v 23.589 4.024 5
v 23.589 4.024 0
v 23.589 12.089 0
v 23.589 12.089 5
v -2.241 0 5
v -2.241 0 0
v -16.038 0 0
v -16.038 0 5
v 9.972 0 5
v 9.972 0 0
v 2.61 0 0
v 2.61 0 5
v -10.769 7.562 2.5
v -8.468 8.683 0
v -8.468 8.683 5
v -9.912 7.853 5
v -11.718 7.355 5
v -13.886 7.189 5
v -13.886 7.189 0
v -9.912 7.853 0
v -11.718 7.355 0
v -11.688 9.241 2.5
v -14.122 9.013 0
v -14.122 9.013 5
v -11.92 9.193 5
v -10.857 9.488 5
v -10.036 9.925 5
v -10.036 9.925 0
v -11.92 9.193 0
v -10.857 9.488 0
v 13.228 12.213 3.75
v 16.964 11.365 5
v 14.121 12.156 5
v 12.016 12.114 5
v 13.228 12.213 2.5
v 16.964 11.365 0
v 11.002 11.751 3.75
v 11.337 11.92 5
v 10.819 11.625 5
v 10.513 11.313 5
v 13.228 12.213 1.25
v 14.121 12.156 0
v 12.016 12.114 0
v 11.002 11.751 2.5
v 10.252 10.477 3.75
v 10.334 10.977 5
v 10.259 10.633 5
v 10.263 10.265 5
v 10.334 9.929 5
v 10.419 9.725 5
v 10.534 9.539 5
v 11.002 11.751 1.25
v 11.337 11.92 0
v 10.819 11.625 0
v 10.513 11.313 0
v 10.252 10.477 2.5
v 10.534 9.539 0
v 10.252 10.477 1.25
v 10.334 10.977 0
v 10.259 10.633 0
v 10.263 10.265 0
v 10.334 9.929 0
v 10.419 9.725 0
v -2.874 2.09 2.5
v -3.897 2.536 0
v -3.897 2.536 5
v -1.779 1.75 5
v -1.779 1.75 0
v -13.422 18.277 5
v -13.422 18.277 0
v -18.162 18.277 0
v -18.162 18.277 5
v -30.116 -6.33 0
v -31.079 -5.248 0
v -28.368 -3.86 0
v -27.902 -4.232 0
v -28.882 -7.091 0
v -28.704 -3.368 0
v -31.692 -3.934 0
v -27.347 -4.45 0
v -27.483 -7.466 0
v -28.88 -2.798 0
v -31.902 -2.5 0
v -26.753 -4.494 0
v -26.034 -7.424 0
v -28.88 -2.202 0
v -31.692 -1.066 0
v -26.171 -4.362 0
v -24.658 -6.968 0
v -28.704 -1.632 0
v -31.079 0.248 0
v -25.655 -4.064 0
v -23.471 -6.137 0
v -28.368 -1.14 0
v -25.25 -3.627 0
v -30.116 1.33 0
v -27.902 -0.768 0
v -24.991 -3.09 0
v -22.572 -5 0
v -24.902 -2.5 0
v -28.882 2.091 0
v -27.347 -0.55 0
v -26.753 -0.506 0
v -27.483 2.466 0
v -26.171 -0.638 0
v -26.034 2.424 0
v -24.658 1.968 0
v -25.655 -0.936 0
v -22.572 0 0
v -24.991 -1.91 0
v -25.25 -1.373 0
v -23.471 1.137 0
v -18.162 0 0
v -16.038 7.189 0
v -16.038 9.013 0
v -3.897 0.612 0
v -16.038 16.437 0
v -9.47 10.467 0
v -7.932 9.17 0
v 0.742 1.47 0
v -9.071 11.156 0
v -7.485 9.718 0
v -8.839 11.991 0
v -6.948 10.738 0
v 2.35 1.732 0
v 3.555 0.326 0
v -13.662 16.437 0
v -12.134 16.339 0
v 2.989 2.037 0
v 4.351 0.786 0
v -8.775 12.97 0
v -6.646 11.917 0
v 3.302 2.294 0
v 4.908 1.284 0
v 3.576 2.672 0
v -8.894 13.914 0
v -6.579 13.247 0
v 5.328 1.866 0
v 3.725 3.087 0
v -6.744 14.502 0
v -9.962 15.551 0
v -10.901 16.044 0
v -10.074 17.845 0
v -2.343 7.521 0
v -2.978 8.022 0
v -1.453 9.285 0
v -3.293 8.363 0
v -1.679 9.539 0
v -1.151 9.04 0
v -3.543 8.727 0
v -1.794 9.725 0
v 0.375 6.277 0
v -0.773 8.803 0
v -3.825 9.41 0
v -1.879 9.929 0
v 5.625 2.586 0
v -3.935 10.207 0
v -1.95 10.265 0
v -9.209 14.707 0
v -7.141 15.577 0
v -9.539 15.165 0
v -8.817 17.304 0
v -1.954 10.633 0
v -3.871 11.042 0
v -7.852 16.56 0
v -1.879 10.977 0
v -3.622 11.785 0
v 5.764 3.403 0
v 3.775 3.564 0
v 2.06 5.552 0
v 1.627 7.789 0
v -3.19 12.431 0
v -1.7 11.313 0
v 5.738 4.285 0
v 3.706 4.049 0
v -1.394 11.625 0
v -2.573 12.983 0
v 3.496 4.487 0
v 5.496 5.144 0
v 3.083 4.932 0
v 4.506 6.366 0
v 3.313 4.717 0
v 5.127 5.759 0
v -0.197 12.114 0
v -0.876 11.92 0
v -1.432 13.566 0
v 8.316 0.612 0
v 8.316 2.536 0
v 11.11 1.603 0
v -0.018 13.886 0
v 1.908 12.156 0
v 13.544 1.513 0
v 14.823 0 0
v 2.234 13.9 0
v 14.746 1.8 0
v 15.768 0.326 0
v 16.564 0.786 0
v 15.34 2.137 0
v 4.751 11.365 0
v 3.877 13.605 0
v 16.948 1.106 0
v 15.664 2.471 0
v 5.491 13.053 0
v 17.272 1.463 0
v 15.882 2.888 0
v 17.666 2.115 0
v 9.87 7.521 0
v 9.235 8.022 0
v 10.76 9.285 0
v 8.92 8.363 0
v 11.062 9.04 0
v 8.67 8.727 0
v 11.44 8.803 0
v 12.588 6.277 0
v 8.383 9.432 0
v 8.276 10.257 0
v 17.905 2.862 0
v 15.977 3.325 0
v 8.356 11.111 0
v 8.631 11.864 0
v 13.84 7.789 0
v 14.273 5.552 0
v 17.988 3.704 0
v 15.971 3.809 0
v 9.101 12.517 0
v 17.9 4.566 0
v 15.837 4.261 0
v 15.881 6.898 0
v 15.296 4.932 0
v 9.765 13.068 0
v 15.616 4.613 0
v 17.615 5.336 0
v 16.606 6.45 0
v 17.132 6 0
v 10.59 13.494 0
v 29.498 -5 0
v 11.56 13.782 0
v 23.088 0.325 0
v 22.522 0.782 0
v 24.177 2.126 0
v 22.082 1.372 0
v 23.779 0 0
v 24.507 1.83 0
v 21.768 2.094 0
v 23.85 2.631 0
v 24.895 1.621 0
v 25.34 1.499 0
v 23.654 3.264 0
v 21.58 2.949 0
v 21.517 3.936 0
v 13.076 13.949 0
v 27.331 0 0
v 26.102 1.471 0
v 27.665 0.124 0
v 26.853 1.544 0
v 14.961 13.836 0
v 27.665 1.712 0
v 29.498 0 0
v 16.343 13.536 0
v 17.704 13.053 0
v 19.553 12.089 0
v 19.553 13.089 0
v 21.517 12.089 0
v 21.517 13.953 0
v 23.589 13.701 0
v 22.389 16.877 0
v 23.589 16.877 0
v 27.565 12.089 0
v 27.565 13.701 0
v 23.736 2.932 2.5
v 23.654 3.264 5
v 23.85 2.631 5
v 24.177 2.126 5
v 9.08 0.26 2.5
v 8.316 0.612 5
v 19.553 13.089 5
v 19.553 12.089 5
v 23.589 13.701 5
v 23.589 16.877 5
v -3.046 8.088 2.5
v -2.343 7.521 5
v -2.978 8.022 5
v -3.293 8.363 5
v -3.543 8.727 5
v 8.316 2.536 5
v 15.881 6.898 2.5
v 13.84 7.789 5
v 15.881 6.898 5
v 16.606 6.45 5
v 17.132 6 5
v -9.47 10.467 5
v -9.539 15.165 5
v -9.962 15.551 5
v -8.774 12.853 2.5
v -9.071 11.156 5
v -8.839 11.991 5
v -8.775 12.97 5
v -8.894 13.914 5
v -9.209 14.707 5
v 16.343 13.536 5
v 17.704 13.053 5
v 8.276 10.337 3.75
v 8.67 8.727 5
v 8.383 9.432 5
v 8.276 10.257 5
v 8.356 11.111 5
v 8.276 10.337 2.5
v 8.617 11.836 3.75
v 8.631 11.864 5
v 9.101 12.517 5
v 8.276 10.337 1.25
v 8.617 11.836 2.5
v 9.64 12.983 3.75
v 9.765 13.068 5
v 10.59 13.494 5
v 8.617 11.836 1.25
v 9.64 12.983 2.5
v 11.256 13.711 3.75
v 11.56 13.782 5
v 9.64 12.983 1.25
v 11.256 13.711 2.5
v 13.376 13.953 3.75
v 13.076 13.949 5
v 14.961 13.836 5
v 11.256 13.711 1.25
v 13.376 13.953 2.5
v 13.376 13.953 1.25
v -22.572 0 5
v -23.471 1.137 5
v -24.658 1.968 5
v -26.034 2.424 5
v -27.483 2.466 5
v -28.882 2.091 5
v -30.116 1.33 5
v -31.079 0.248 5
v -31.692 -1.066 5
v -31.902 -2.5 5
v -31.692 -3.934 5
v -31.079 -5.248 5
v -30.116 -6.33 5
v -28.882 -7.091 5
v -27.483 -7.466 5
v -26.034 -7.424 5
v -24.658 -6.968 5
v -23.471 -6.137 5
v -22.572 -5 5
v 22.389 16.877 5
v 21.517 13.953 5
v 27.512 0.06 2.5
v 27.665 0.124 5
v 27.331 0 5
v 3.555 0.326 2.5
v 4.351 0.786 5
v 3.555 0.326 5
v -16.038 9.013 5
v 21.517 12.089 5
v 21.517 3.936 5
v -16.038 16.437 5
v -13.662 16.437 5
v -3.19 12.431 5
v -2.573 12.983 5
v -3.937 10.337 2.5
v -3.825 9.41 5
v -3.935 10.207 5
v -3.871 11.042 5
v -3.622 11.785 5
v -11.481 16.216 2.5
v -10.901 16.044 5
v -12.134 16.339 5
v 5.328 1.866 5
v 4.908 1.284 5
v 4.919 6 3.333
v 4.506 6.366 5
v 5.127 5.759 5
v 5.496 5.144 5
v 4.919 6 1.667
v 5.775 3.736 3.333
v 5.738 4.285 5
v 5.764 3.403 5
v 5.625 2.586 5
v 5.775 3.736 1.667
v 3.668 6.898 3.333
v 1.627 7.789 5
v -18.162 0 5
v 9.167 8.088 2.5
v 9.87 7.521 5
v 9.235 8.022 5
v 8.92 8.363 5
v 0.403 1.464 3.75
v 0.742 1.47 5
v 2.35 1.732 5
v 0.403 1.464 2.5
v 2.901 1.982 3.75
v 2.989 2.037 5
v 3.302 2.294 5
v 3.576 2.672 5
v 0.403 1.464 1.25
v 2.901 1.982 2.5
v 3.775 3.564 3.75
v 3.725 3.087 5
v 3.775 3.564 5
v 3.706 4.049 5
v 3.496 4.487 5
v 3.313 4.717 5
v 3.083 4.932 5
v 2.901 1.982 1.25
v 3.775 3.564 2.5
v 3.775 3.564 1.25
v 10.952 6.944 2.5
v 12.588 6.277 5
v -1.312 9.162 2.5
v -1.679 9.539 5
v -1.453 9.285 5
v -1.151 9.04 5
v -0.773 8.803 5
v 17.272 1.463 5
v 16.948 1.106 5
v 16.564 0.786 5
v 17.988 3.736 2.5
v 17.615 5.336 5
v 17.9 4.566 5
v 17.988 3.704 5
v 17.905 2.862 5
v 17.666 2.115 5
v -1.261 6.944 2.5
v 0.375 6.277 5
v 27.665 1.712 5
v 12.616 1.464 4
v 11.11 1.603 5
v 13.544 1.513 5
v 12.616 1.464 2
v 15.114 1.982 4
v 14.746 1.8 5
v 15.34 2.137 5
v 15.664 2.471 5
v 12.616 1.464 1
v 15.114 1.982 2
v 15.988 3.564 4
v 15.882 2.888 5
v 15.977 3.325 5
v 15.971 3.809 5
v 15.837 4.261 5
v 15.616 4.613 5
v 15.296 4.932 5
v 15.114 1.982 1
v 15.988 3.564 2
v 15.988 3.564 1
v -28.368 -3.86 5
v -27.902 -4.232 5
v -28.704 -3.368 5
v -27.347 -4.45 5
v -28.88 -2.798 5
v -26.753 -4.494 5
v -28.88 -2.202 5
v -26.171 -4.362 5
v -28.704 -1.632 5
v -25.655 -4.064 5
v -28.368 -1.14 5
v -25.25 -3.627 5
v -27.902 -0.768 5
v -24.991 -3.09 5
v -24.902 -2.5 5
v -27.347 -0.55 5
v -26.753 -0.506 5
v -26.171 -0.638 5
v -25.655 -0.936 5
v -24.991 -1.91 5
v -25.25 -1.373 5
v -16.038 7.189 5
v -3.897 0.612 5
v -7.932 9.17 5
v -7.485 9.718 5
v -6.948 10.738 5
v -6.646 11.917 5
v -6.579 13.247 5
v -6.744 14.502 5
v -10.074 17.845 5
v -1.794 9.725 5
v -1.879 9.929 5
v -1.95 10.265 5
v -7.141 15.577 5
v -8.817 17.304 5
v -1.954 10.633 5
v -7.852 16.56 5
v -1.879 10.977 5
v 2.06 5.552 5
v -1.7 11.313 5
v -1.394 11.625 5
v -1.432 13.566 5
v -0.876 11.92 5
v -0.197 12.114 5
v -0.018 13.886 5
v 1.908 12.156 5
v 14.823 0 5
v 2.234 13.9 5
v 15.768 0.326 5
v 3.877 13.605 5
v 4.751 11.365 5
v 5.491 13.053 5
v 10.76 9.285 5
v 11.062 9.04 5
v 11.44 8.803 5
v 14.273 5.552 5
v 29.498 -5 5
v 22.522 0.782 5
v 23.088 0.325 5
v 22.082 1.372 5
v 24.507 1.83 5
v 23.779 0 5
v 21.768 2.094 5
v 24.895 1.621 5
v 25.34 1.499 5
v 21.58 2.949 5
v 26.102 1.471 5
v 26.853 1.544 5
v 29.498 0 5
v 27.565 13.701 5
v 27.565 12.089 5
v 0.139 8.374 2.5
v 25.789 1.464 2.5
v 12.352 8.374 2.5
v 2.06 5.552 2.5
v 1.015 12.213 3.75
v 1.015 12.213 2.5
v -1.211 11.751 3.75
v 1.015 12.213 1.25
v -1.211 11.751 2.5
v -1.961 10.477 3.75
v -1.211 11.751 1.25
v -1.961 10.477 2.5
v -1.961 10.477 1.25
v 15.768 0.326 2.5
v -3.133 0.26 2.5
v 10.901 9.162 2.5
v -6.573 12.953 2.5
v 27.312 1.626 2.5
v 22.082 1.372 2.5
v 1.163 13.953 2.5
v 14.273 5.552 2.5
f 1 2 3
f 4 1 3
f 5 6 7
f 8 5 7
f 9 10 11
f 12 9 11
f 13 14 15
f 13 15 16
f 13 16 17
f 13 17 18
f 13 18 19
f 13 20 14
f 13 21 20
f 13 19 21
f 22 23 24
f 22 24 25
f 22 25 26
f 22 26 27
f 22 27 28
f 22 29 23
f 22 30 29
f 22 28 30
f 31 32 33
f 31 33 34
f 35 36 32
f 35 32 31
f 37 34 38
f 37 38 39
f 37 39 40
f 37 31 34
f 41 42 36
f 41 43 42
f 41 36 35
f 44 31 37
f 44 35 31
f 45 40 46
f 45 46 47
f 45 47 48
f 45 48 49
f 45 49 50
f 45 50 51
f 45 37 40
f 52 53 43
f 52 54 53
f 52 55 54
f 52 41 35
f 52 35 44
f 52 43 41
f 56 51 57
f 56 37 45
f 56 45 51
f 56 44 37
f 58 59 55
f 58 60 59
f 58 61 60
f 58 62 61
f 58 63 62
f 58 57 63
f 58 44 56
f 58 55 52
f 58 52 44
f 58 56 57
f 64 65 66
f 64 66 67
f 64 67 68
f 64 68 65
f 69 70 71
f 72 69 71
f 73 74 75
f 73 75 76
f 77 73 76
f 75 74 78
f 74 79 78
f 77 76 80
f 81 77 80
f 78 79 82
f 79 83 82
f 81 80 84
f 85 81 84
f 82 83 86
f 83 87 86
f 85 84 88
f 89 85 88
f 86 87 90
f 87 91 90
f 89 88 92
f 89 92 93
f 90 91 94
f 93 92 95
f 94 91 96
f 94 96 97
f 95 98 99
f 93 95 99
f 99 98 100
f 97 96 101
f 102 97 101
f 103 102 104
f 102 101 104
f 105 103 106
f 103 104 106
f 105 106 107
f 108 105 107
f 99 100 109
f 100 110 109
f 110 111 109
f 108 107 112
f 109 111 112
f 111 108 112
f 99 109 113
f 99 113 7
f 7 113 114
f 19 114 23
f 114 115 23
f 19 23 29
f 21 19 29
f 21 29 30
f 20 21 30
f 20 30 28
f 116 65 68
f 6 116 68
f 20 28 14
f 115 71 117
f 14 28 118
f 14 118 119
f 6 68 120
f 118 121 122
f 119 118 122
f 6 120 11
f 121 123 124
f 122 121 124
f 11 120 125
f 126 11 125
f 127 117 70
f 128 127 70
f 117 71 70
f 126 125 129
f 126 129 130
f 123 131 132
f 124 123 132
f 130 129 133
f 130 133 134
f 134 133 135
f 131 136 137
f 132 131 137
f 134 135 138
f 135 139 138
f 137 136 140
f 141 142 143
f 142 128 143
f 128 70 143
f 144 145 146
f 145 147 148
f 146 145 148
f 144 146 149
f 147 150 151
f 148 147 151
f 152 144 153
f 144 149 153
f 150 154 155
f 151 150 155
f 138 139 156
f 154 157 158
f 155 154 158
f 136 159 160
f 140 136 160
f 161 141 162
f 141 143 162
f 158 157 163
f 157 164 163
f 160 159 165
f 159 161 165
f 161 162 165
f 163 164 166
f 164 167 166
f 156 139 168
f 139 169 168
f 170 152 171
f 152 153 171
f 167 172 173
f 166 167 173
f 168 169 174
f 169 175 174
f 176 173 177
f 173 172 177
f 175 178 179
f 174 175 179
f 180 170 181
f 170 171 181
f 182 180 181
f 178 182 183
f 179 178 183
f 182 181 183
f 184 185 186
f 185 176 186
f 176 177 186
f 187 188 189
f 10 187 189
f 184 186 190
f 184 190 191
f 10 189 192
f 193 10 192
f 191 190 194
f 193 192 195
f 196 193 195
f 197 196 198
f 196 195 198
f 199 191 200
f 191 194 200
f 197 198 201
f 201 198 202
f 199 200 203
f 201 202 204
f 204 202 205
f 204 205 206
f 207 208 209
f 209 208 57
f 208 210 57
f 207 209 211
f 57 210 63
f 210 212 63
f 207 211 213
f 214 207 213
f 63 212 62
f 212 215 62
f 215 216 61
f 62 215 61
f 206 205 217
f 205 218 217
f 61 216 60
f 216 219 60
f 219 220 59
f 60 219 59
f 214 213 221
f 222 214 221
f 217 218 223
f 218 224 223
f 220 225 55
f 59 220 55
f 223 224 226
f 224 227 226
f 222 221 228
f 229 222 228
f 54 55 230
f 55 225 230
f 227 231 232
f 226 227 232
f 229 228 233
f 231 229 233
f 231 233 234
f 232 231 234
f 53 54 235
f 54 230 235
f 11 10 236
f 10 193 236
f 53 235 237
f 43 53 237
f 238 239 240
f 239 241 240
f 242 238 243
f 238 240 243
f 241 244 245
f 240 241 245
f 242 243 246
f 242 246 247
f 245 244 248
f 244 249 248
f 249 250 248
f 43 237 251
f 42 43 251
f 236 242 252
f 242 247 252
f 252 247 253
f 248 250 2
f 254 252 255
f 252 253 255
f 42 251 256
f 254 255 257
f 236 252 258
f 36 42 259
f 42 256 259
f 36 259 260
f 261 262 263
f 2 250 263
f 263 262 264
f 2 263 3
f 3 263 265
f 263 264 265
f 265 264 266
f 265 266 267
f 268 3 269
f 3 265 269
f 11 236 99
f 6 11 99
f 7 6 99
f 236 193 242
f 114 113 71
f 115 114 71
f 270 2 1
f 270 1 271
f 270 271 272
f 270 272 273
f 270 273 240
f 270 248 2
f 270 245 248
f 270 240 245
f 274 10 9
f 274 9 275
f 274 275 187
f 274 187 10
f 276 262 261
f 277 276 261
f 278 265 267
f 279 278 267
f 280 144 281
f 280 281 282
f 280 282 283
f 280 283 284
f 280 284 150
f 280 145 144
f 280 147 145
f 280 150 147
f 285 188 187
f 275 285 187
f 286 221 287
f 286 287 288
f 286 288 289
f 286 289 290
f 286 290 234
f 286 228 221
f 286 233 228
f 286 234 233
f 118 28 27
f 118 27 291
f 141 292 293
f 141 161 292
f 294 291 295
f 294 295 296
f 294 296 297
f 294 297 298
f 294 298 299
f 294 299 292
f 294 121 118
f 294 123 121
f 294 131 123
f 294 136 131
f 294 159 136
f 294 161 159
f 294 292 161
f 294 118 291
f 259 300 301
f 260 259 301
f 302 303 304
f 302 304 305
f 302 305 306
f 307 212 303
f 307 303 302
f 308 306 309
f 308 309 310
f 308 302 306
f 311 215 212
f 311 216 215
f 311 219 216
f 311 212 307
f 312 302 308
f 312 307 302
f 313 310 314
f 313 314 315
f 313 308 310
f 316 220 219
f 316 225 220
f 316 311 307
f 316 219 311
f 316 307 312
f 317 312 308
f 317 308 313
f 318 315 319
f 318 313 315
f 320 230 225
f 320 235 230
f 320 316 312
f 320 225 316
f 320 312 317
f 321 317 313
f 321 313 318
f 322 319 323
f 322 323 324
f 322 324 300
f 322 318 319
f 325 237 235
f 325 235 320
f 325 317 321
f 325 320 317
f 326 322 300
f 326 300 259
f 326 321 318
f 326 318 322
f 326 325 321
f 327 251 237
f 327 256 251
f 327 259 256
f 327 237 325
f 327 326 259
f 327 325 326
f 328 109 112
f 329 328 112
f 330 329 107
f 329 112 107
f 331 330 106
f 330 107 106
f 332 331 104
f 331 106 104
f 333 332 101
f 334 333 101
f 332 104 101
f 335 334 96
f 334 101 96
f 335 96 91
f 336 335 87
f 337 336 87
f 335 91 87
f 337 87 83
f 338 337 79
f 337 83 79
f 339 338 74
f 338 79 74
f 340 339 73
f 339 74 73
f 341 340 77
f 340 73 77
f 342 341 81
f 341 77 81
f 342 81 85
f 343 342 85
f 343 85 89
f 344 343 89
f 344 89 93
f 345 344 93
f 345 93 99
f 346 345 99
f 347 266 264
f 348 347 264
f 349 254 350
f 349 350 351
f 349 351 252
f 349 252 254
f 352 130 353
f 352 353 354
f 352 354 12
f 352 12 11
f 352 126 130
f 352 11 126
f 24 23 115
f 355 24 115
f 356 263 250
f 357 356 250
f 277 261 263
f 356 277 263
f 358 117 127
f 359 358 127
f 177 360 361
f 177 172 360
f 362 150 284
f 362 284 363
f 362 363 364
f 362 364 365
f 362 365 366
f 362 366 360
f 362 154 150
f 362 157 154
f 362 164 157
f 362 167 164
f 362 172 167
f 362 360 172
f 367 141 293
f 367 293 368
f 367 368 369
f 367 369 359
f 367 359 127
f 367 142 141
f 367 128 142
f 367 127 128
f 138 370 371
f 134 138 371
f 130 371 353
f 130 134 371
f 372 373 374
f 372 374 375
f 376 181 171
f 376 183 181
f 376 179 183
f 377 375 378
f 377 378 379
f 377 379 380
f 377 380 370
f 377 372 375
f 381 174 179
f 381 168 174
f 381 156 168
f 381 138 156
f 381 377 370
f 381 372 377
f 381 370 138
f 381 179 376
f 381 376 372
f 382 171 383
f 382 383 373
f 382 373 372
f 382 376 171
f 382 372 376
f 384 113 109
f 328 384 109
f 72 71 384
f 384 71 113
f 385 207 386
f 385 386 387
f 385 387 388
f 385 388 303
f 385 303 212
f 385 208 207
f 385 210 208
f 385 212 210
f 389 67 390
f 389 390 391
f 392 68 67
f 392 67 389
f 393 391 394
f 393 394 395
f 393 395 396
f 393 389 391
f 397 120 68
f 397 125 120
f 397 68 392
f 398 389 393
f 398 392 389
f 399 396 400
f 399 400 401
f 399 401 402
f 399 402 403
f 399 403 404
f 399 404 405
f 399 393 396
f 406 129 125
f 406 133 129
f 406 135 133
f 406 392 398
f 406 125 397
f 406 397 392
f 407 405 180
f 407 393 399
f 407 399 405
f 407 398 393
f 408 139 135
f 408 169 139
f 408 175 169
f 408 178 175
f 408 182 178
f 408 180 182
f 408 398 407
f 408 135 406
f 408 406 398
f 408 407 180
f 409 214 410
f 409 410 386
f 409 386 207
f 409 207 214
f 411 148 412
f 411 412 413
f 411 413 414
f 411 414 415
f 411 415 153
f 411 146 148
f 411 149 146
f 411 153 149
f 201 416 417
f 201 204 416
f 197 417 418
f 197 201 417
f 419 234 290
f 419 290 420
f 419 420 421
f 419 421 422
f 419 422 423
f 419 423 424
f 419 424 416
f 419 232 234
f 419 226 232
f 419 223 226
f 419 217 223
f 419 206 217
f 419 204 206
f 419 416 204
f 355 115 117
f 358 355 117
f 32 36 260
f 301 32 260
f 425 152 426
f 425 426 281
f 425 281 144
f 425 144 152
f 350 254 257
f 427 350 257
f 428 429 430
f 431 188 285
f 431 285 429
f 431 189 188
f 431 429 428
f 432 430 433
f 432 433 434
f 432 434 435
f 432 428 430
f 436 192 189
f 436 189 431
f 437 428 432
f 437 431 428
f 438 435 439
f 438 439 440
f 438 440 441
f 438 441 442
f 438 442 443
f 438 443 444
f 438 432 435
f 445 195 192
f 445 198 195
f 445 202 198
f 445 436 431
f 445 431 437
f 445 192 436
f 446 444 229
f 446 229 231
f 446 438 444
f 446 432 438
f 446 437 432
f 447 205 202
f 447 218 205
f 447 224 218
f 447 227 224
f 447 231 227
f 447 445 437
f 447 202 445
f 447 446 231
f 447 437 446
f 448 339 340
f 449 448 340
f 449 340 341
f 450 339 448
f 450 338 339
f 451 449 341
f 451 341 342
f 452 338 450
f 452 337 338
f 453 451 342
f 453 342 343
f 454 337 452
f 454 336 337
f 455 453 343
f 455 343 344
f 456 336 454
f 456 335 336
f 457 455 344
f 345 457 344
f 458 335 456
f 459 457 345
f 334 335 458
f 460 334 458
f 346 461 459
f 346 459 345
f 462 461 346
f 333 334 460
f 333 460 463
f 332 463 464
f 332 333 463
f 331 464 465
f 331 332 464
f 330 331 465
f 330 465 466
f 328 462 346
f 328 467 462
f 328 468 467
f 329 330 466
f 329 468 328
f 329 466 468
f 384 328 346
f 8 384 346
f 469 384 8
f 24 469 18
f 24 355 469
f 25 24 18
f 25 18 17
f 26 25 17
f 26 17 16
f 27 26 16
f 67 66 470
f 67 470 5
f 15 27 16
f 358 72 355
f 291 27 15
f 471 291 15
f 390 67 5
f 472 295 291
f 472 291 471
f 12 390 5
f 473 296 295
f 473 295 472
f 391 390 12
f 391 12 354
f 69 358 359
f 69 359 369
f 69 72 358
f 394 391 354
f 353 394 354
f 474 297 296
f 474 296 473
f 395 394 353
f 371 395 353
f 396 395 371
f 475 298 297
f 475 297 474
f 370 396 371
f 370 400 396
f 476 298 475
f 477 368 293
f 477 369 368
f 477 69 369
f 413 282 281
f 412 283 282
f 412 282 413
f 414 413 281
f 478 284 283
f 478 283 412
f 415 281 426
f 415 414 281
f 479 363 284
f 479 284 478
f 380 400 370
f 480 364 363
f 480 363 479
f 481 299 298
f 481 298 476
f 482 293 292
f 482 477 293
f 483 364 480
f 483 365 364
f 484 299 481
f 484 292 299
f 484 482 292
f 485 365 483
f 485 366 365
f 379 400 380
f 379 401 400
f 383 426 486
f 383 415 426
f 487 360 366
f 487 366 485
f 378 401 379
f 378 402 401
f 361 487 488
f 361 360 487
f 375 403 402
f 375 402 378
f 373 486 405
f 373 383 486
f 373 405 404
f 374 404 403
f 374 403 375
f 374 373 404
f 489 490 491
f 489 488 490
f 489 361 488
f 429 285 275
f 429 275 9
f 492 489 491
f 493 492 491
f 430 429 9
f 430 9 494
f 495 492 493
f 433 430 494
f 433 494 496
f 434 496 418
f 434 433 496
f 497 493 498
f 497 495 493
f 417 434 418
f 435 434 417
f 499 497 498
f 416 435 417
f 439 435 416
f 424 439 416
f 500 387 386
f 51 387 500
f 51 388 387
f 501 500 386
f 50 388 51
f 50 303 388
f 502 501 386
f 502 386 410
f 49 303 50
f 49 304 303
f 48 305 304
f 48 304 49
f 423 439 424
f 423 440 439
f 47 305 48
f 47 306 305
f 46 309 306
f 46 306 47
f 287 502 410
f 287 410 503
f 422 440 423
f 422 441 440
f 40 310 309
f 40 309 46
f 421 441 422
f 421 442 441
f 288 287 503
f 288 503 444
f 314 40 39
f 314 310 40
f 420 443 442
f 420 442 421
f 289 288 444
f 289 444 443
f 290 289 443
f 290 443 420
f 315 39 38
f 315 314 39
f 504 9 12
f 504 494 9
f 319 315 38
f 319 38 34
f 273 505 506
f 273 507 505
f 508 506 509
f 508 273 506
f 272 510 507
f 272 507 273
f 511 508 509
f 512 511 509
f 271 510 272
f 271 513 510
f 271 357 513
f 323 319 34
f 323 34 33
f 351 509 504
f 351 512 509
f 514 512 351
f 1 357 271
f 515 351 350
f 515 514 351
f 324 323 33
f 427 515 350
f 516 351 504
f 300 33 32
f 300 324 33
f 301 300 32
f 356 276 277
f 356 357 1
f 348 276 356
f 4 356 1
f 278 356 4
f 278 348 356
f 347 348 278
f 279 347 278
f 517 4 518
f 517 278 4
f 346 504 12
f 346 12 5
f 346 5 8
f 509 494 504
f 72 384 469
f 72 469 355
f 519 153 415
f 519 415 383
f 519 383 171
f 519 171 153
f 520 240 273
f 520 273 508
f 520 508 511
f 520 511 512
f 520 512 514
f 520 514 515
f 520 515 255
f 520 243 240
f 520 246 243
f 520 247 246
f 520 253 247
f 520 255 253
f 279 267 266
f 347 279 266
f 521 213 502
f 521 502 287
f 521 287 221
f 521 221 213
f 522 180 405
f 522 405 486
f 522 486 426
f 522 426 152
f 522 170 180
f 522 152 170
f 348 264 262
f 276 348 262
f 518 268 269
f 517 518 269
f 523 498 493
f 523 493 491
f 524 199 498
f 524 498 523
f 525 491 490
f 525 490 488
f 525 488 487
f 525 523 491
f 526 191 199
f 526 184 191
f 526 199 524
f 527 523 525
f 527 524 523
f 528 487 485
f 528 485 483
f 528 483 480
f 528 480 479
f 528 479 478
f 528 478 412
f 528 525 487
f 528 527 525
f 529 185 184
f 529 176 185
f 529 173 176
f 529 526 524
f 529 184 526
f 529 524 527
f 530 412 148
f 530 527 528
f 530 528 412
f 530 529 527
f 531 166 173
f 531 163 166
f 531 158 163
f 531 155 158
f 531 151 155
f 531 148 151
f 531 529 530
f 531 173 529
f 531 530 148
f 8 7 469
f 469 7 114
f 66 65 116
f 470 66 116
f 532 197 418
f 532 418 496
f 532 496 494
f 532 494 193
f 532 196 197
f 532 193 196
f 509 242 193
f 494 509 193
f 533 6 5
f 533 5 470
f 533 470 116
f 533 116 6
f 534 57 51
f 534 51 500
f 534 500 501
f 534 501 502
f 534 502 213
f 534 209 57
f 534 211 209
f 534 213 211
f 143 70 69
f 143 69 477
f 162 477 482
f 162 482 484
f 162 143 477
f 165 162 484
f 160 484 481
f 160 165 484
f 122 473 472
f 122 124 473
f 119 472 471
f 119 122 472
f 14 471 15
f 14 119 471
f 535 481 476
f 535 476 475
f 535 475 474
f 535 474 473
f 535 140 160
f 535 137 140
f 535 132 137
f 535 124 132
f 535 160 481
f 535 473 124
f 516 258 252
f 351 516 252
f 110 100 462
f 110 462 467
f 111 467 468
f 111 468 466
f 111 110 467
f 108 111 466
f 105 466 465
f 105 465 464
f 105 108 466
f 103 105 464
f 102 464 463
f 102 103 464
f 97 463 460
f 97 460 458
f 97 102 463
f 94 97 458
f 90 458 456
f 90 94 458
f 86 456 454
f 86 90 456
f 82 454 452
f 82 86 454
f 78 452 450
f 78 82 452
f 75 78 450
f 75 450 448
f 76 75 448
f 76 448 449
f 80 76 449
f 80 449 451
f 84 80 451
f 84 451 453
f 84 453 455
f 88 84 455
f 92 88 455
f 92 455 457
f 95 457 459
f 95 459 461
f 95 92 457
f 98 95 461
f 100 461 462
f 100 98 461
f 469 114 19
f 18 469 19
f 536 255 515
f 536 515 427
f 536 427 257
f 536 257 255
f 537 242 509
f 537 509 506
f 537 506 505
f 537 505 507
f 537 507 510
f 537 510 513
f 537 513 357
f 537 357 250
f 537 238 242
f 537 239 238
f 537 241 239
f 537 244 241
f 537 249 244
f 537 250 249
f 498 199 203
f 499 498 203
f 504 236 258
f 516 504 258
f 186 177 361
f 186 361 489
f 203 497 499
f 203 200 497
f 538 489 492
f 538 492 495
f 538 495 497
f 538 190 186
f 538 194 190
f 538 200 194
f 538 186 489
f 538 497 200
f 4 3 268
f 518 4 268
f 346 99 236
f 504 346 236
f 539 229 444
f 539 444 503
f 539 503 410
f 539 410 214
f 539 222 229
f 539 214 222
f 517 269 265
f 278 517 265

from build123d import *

# Parameters (mm, degrees)
F0_R     = 2
F1_DEPTH = 5


with BuildPart() as f1:
    # F0 (on Top) → F1 (new body)
    with BuildSketch(Plane.XY):
        with BuildLine():
            Line((-18.1624217064, 0), (-22.5719264863, 0))
            ThreePointArc((-22.5719264863, 0), (-22.0724243737, -1.2059047745), (-21.9020535052, -2.5))
            ThreePointArc((-21.9020535052, -2.5), (-22.0724243737, -3.7940952255), (-22.5719264863, -5))
            Line((-22.5719264863, -5), (29.4983200729, -5))
            Line((29.4983200729, -5), (29.4983200729, 0))
            Line((29.4983200729, 0), (27.3306982624, 0))
            add(Edge.make_bspline(
                [(27.3306982624, 0), (27.0565868286, -0.0808872186), (26.6731651405, -0.1440115209)],
                knots=[0.4155624782, 0.4155624782, 0.4155624782, 1, 1, 1], degree=2))
            add(Edge.make_bspline(
                [(26.6731651405, -0.1440115209), (26.0171126563, -0.2520201616), (25.4890704129, -0.2520201616)],
                knots=[0, 0, 0, 1, 1, 1], degree=2))
            add(Edge.make_bspline(
                [(25.4890704129, -0.2520201616), (24.5146622385, -0.2520201616), (23.7792760511, 0)],
                knots=[0, 0, 0, 0.245299653, 0.245299653, 0.245299653], degree=2))
            Line((23.7792760511, 0), (14.8230424682, 0))
            add(Edge.make_bspline(
                [(14.8230424682, 0), (13.8333887774, -0.2520201616), (12.5640364102, -0.2520201616)],
                knots=[0.5072784088, 0.5072784088, 0.5072784088, 1, 1, 1], degree=2))
            add(Edge.make_bspline(
                [(12.5640364102, -0.2520201616), (11.092790572, -0.2520201616), (9.9715727361, 0)],
                knots=[0, 0, 0, 0.5400617249, 0.5400617249, 0.5400617249], degree=2))
            Line((9.9715727361, 0), (2.61006543, 0))
            add(Edge.make_bspline(
                [(2.61006543, 0), (1.6204117393, -0.2520201616), (0.3510593721, -0.2520201616)],
                knots=[0.5072784088, 0.5072784088, 0.5072784088, 1, 1, 1], degree=2))
            add(Edge.make_bspline(
                [(0.3510593721, -0.2520201616), (-1.1201864661, -0.2520201616), (-2.2414043021, 0)],
                knots=[0, 0, 0, 0.5400617249, 0.5400617249, 0.5400617249], degree=2))
            Line((-2.2414043021, 0), (-16.0382517728, 0))
            Line((-16.0382517728, 0), (-18.1624217064, 0))
        make_face()
        with BuildLine():
            ThreePointArc((-21.9020535052, -2.5), (-22.0724243737, -1.2059047745), (-22.5719264863, 0))
            ThreePointArc((-22.5719264863, 0), (-31.9020535052, -2.5), (-22.5719264863, -5))
            ThreePointArc((-22.5719264863, -5), (-22.0724243737, -3.7940952255), (-21.9020535052, -2.5))
        make_face()
        with Locations((-26.9020535052, -2.5)):
            Circle(F0_R, mode=Mode.SUBTRACT)
        with BuildLine():
            Line((-18.1624217064, 18.277462197), (-18.1624217064, 0))
            Line((-18.1624217064, 0), (-16.0382517728, 0))
            Line((-16.0382517728, 0), (-16.0382517728, 7.188575086))
            Line((-16.0382517728, 7.188575086), (-13.8860795991, 7.188575086))
            add(Edge.make_bspline(
                [(-8.4676461244, 8.6826946156), (-10.3617976565, 7.188575086), (-13.8860795991, 7.188575086)],
                knots=[0, 0, 0, 1, 1, 1], degree=2))
            add(Edge.make_bspline(
                [(-6.5734945923, 12.9530362429), (-6.5734945923, 10.1768141451), (-8.4676461244, 8.6826946156)],
                knots=[0, 0, 0, 1, 1, 1], degree=2))
            add(Edge.make_bspline(
                [(-13.4220424761, 18.277462197), (-6.5734945923, 18.277462197), (-6.5734945923, 12.9530362429)],
                knots=[0, 0, 0, 1, 1, 1], degree=2))
            Line((-13.4220424761, 18.277462197), (-18.1624217064, 18.277462197))
        make_face()
        with BuildLine():
            Line((-14.1220984806, 9.0127210177), (-16.0382517728, 9.0127210177))
            Line((-16.0382517728, 9.0127210177), (-16.0382517728, 16.4373149852))
            Line((-16.0382517728, 16.4373149852), (-13.6620616776, 16.4373149852))
            add(Edge.make_bspline(
                [(-9.9617656539, 15.5512440995), (-11.1498607015, 16.4373149852), (-13.6620616776, 16.4373149852)],
                knots=[0, 0, 0, 1, 1, 1], degree=2))
            add(Edge.make_bspline(
                [(-8.7736706063, 12.8530282423), (-8.7736706063, 14.6651732139), (-9.9617656539, 15.5512440995)],
                knots=[0, 0, 0, 1, 1, 1], degree=2))
            add(Edge.make_bspline(
                [(-10.0357715744, 9.9247939835), (-8.7736706063, 10.8368669494), (-8.7736706063, 12.8530282423)],
                knots=[0, 0, 0, 1, 1, 1], degree=2))
            add(Edge.make_bspline(
                [(-14.1220984806, 9.0127210177), (-11.2978725425, 9.0127210177), (-10.0357715744, 9.9247939835)],
                knots=[0, 0, 0, 1, 1, 1], degree=2))
        make_face(mode=Mode.SUBTRACT)
        with BuildLine():
            add(Edge.make_bspline(
                [(-2.2414043021, 0), (-3.1962784837, 0.2146305007), (-3.8972804951, 0.6120489639)],
                knots=[0.5400617249, 0.5400617249, 0.5400617249, 1, 1, 1], degree=2))
            Line((-2.2414043021, 0), (2.61006543, 0))
            add(Edge.make_bspline(
                [(4.3513793977, 0.786062885), (3.6289571498, 0.259465769), (2.61006543, 0)],
                knots=[0, 0, 0, 0.5072784088, 0.5072784088, 0.5072784088], degree=2))
            add(Edge.make_bspline(
                [(5.7754933268, 3.7362989039), (5.7754933268, 1.8241459317), (4.3513793977, 0.786062885)],
                knots=[0, 0, 0, 1, 1, 1], degree=2))
            add(Edge.make_bspline(
                [(4.9194248413, 6.0004800384), (5.7754933268, 5.1004080326), (5.7754933268, 3.7362989039)],
                knots=[0, 0, 0, 1, 1, 1], degree=2))
            add(Edge.make_bspline(
                [(1.6271614602, 7.7886230898), (4.0633563558, 6.9005520442), (4.9194248413, 6.0004800384)],
                knots=[0, 0, 0, 1, 1, 1], degree=2))
            add(Edge.make_bspline(
                [(-0.7730305551, 8.8027042163), (-0.1489806311, 8.4526762141), (1.6271614602, 7.7886230898)],
                knots=[0, 0, 0, 1, 1, 1], degree=2))
            add(Edge.make_bspline(
                [(-1.6791030409, 9.538763101), (-1.3970804791, 9.1527322186), (-0.7730305551, 8.8027042163)],
                knots=[0, 0, 0, 1, 1, 1], degree=2))
            add(Edge.make_bspline(
                [(-1.9611256027, 10.4768381471), (-1.9611256027, 9.9247939835), (-1.6791030409, 9.538763101)],
                knots=[0, 0, 0, 1, 1, 1], degree=2))
            add(Edge.make_bspline(
                [(-1.2110655979, 11.7509400752), (-1.9611256027, 11.2889031122), (-1.9611256027, 10.4768381471)],
                knots=[0, 0, 0, 1, 1, 1], degree=2))
            add(Edge.make_bspline(
                [(1.0151124963, 12.2129770382), (-0.4610055931, 12.2129770382), (-1.2110655979, 11.7509400752)],
                knots=[0, 0, 0, 1, 1, 1], degree=2))
            add(Edge.make_bspline(
                [(4.7514114002, 11.3649091927), (2.691246587, 12.2129770382), (1.0151124963, 12.2129770382)],
                knots=[0, 0, 0, 1, 1, 1], degree=2))
            Line((4.7514114002, 11.3649091927), (5.491470605, 13.0530442435))
            add(Edge.make_bspline(
                [(1.1631243373, 13.9531162493), (3.3753013114, 13.9531162493), (5.491470605, 13.0530442435)],
                knots=[0, 0, 0, 1, 1, 1], degree=2))
            add(Edge.make_bspline(
                [(-2.5731745667, 12.9830386431), (-1.2090654379, 13.9531162493), (1.1631243373, 13.9531162493)],
                knots=[0, 0, 0, 1, 1, 1], degree=2))
            add(Edge.make_bspline(
                [(-3.9372836954, 10.3368269462), (-3.9372836954, 12.0129610369), (-2.5731745667, 12.9830386431)],
                knots=[0, 0, 0, 1, 1, 1], degree=2))
            add(Edge.make_bspline(
                [(-3.5432521729, 8.7266981359), (-3.9372836954, 9.4007520602), (-3.9372836954, 10.3368269462)],
                knots=[0, 0, 0, 1, 1, 1], degree=2))
            add(Edge.make_bspline(
                [(-2.3431561652, 7.5206016481), (-3.1492206503, 8.0526442115), (-3.5432521729, 8.7266981359)],
                knots=[0, 0, 0, 1, 1, 1], degree=2))
            add(Edge.make_bspline(
                [(0.3750612922, 6.2765021202), (-1.53709168, 6.9885590847), (-2.3431561652, 7.5206016481)],
                knots=[0, 0, 0, 1, 1, 1], degree=2))
            add(Edge.make_bspline(
                [(3.0832779495, 4.9323945916), (2.3912225851, 5.5004400352), (0.3750612922, 6.2765021202)],
                knots=[0, 0, 0, 1, 1, 1], degree=2))
            add(Edge.make_bspline(
                [(3.775333314, 3.5642851428), (3.775333314, 4.3643491479), (3.0832779495, 4.9323945916)],
                knots=[0, 0, 0, 1, 1, 1], degree=2))
            add(Edge.make_bspline(
                [(2.9012633884, 1.9821585727), (3.775333314, 2.500200016), (3.775333314, 3.5642851428)],
                knots=[0, 0, 0, 1, 1, 1], degree=2))
            add(Edge.make_bspline(
                [(0.4030635324, 1.4641171294), (2.0271934628, 1.4641171294), (2.9012633884, 1.9821585727)],
                knots=[0, 0, 0, 1, 1, 1], degree=2))
            add(Edge.make_bspline(
                [(-1.7791110416, 1.7501400112), (-0.6490206343, 1.4641171294), (0.4030635324, 1.4641171294)],
                knots=[0, 0, 0, 1, 1, 1], degree=2))
            add(Edge.make_bspline(
                [(-3.8972804951, 2.5362028962), (-2.9092014488, 2.036162893), (-1.7791110416, 1.7501400112)],
                knots=[0, 0, 0, 1, 1, 1], degree=2))
            Line((-3.8972804951, 2.5362028962), (-3.8972804951, 0.6120489639))
        make_face()
        with BuildLine():
            Line((2.61006543, 0), (-2.2414043021, 0))
            add(Edge.make_bspline(
                [(0.3510593721, -0.2520201616), (-1.1201864661, -0.2520201616), (-2.2414043021, 0)],
                knots=[0, 0, 0, 0.5400617249, 0.5400617249, 0.5400617249], degree=2))
            add(Edge.make_bspline(
                [(2.61006543, 0), (1.6204117393, -0.2520201616), (0.3510593721, -0.2520201616)],
                knots=[0.5072784088, 0.5072784088, 0.5072784088, 1, 1, 1], degree=2))
        make_face()
        with BuildLine():
            add(Edge.make_bspline(
                [(27.3306982624, 0), (27.0565868286, -0.0808872186), (26.6731651405, -0.1440115209)],
                knots=[0.4155624782, 0.4155624782, 0.4155624782, 1, 1, 1], degree=2))
            Line((27.3306982624, 0), (23.7792760511, 0))
            add(Edge.make_bspline(
                [(25.4890704129, -0.2520201616), (24.5146622385, -0.2520201616), (23.7792760511, 0)],
                knots=[0, 0, 0, 0.245299653, 0.245299653, 0.245299653], degree=2))
            add(Edge.make_bspline(
                [(26.6731651405, -0.1440115209), (26.0171126563, -0.2520201616), (25.4890704129, -0.2520201616)],
                knots=[0, 0, 0, 1, 1, 1], degree=2))
        make_face()
        with BuildLine():
            Line((23.7792760511, 0), (27.3306982624, 0))
            add(Edge.make_bspline(
                [(27.6652445069, 0.1240099208), (27.525604343, 0.0575146047), (27.3306982624, 0)],
                knots=[0, 0, 0, 0.4155624782, 0.4155624782, 0.4155624782], degree=2))
            Line((27.6652445069, 0.1240099208), (27.6652445069, 1.712136971))
            add(Edge.make_bspline(
                [(26.8531795417, 1.5441235299), (27.3652205049, 1.6241299304), (27.6652445069, 1.712136971)],
                knots=[0, 0, 0, 1, 1, 1], degree=2))
            add(Edge.make_bspline(
                [(25.7890944149, 1.4641171294), (26.3411385784, 1.4641171294), (26.8531795417, 1.5441235299)],
                knots=[0, 0, 0, 1, 1, 1], degree=2))
            add(Edge.make_bspline(
                [(24.1769654445, 2.1261700936), (24.7650124883, 1.4641171294), (25.7890944149, 1.4641171294)],
                knots=[0, 0, 0, 1, 1, 1], degree=2))
            add(Edge.make_bspline(
                [(23.5889184008, 4.0243219458), (23.5889184008, 2.7882230578), (24.1769654445, 2.1261700936)],
                knots=[0, 0, 0, 1, 1, 1], degree=2))
            Line((23.5889184008, 4.0243219458), (23.5889184008, 12.0889671174))
            Line((23.5889184008, 12.0889671174), (27.5652365062, 12.0889671174))
            Line((27.5652365062, 12.0889671174), (27.5652365062, 13.7010960877))
            Line((27.5652365062, 13.7010960877), (23.5889184008, 13.7010960877))
            Line((23.5889184008, 13.7010960877), (23.5889184008, 16.877350188))
            Line((23.5889184008, 16.877350188), (22.3888223931, 16.877350188))
            Line((22.3888223931, 16.877350188), (21.5167526275, 13.9531162493))
            Line((21.5167526275, 13.9531162493), (19.5525954949, 13.0890471238))
            Line((19.5525954949, 13.0890471238), (19.5525954949, 12.0889671174))
            Line((19.5525954949, 12.0889671174), (21.5167526275, 12.0889671174))
            Line((21.5167526275, 12.0889671174), (21.5167526275, 3.9363149052))
            add(Edge.make_bspline(
                [(23.7792760511, 0), (21.5167526275, 0.775376977), (21.5167526275, 3.9363149052)],
                knots=[0.245299653, 0.245299653, 0.245299653, 1, 1, 1], degree=2))
        make_face()
        with BuildLine():
            add(Edge.make_bspline(
                [(9.9715727361, 0), (9.0166985545, 0.2146305007), (8.315696543, 0.6120489639)],
                knots=[0.5400617249, 0.5400617249, 0.5400617249, 1, 1, 1], degree=2))
            Line((9.9715727361, 0), (14.8230424682, 0))
            add(Edge.make_bspline(
                [(16.5643564358, 0.786062885), (15.841934188, 0.259465769), (14.8230424682, 0)],
                knots=[0, 0, 0, 0.5072784088, 0.5072784088, 0.5072784088], degree=2))
            add(Edge.make_bspline(
                [(17.9884703649, 3.7362989039), (17.9884703649, 1.8241459317), (16.5643564358, 0.786062885)],
                knots=[0, 0, 0, 1, 1, 1], degree=2))
            add(Edge.make_bspline(
                [(17.1324018795, 6.0004800384), (17.9884703649, 5.1004080326), (17.9884703649, 3.7362989039)],
                knots=[0, 0, 0, 1, 1, 1], degree=2))
            add(Edge.make_bspline(
                [(13.8401384984, 7.7886230898), (16.276333394, 6.9005520442), (17.1324018795, 6.0004800384)],
                knots=[0, 0, 0, 1, 1, 1], degree=2))
            add(Edge.make_bspline(
                [(11.439946483, 8.8027042163), (12.063996407, 8.4526762141), (13.8401384984, 7.7886230898)],
                knots=[0, 0, 0, 1, 1, 1], degree=2))
            add(Edge.make_bspline(
                [(10.5338739972, 9.538763101), (10.815896559, 9.1527322186), (11.439946483, 8.8027042163)],
                knots=[0, 0, 0, 1, 1, 1], degree=2))
            add(Edge.make_bspline(
                [(10.2518514354, 10.4768381471), (10.2518514354, 9.9247939835), (10.5338739972, 9.538763101)],
                knots=[0, 0, 0, 1, 1, 1], degree=2))
            add(Edge.make_bspline(
                [(11.0019114402, 11.7509400752), (10.2518514354, 11.2889031122), (10.2518514354, 10.4768381471)],
                knots=[0, 0, 0, 1, 1, 1], degree=2))
            add(Edge.make_bspline(
                [(13.2280895345, 12.2129770382), (11.751971445, 12.2129770382), (11.0019114402, 11.7509400752)],
                knots=[0, 0, 0, 1, 1, 1], degree=2))
            add(Edge.make_bspline(
                [(16.9643884384, 11.3649091927), (14.9042236252, 12.2129770382), (13.2280895345, 12.2129770382)],
                knots=[0, 0, 0, 1, 1, 1], degree=2))
            Line((16.9643884384, 11.3649091927), (17.7044476431, 13.0530442435))
            add(Edge.make_bspline(
                [(13.3761013754, 13.9531162493), (15.5882783496, 13.9531162493), (17.7044476431, 13.0530442435)],
                knots=[0, 0, 0, 1, 1, 1], degree=2))
            add(Edge.make_bspline(
                [(9.6398024715, 12.9830386431), (11.0039116002, 13.9531162493), (13.3761013754, 13.9531162493)],
                knots=[0, 0, 0, 1, 1, 1], degree=2))
            add(Edge.make_bspline(
                [(8.2756933428, 10.3368269462), (8.2756933428, 12.0129610369), (9.6398024715, 12.9830386431)],
                knots=[0, 0, 0, 1, 1, 1], degree=2))
            add(Edge.make_bspline(
                [(8.6697248653, 8.7266981359), (8.2756933428, 9.4007520602), (8.2756933428, 10.3368269462)],
                knots=[0, 0, 0, 1, 1, 1], degree=2))
            add(Edge.make_bspline(
                [(9.869820873, 7.5206016481), (9.0637563878, 8.0526442115), (8.6697248653, 8.7266981359)],
                knots=[0, 0, 0, 1, 1, 1], degree=2))
            add(Edge.make_bspline(
                [(12.5880383304, 6.2765021202), (10.6758853581, 6.9885590847), (9.869820873, 7.5206016481)],
                knots=[0, 0, 0, 1, 1, 1], degree=2))
            add(Edge.make_bspline(
                [(15.2962549877, 4.9323945916), (14.6041996233, 5.5004400352), (12.5880383304, 6.2765021202)],
                knots=[0, 0, 0, 1, 1, 1], degree=2))
            add(Edge.make_bspline(
                [(15.9883103521, 3.5642851428), (15.9883103521, 4.3643491479), (15.2962549877, 4.9323945916)],
                knots=[0, 0, 0, 1, 1, 1], degree=2))
            add(Edge.make_bspline(
                [(15.1142404265, 1.9821585727), (15.9883103521, 2.500200016), (15.9883103521, 3.5642851428)],
                knots=[0, 0, 0, 1, 1, 1], degree=2))
            add(Edge.make_bspline(
                [(12.6160405706, 1.4641171294), (14.2401705009, 1.4641171294), (15.1142404265, 1.9821585727)],
                knots=[0, 0, 0, 1, 1, 1], degree=2))
            add(Edge.make_bspline(
                [(10.4338659966, 1.7501400112), (11.5639564038, 1.4641171294), (12.6160405706, 1.4641171294)],
                knots=[0, 0, 0, 1, 1, 1], degree=2))
            add(Edge.make_bspline(
                [(8.315696543, 2.5362028962), (9.3037755894, 2.036162893), (10.4338659966, 1.7501400112)],
                knots=[0, 0, 0, 1, 1, 1], degree=2))
            Line((8.315696543, 2.5362028962), (8.315696543, 0.6120489639))
        make_face()
        with BuildLine():
            Line((14.8230424682, 0), (9.9715727361, 0))
            add(Edge.make_bspline(
                [(12.5640364102, -0.2520201616), (11.092790572, -0.2520201616), (9.9715727361, 0)],
                knots=[0, 0, 0, 0.5400617249, 0.5400617249, 0.5400617249], degree=2))
            add(Edge.make_bspline(
                [(14.8230424682, 0), (13.8333887774, -0.2520201616), (12.5640364102, -0.2520201616)],
                knots=[0.5072784088, 0.5072784088, 0.5072784088, 1, 1, 1], degree=2))
        make_face()
    extrude(amount=F1_DEPTH)


solid = f1.part
